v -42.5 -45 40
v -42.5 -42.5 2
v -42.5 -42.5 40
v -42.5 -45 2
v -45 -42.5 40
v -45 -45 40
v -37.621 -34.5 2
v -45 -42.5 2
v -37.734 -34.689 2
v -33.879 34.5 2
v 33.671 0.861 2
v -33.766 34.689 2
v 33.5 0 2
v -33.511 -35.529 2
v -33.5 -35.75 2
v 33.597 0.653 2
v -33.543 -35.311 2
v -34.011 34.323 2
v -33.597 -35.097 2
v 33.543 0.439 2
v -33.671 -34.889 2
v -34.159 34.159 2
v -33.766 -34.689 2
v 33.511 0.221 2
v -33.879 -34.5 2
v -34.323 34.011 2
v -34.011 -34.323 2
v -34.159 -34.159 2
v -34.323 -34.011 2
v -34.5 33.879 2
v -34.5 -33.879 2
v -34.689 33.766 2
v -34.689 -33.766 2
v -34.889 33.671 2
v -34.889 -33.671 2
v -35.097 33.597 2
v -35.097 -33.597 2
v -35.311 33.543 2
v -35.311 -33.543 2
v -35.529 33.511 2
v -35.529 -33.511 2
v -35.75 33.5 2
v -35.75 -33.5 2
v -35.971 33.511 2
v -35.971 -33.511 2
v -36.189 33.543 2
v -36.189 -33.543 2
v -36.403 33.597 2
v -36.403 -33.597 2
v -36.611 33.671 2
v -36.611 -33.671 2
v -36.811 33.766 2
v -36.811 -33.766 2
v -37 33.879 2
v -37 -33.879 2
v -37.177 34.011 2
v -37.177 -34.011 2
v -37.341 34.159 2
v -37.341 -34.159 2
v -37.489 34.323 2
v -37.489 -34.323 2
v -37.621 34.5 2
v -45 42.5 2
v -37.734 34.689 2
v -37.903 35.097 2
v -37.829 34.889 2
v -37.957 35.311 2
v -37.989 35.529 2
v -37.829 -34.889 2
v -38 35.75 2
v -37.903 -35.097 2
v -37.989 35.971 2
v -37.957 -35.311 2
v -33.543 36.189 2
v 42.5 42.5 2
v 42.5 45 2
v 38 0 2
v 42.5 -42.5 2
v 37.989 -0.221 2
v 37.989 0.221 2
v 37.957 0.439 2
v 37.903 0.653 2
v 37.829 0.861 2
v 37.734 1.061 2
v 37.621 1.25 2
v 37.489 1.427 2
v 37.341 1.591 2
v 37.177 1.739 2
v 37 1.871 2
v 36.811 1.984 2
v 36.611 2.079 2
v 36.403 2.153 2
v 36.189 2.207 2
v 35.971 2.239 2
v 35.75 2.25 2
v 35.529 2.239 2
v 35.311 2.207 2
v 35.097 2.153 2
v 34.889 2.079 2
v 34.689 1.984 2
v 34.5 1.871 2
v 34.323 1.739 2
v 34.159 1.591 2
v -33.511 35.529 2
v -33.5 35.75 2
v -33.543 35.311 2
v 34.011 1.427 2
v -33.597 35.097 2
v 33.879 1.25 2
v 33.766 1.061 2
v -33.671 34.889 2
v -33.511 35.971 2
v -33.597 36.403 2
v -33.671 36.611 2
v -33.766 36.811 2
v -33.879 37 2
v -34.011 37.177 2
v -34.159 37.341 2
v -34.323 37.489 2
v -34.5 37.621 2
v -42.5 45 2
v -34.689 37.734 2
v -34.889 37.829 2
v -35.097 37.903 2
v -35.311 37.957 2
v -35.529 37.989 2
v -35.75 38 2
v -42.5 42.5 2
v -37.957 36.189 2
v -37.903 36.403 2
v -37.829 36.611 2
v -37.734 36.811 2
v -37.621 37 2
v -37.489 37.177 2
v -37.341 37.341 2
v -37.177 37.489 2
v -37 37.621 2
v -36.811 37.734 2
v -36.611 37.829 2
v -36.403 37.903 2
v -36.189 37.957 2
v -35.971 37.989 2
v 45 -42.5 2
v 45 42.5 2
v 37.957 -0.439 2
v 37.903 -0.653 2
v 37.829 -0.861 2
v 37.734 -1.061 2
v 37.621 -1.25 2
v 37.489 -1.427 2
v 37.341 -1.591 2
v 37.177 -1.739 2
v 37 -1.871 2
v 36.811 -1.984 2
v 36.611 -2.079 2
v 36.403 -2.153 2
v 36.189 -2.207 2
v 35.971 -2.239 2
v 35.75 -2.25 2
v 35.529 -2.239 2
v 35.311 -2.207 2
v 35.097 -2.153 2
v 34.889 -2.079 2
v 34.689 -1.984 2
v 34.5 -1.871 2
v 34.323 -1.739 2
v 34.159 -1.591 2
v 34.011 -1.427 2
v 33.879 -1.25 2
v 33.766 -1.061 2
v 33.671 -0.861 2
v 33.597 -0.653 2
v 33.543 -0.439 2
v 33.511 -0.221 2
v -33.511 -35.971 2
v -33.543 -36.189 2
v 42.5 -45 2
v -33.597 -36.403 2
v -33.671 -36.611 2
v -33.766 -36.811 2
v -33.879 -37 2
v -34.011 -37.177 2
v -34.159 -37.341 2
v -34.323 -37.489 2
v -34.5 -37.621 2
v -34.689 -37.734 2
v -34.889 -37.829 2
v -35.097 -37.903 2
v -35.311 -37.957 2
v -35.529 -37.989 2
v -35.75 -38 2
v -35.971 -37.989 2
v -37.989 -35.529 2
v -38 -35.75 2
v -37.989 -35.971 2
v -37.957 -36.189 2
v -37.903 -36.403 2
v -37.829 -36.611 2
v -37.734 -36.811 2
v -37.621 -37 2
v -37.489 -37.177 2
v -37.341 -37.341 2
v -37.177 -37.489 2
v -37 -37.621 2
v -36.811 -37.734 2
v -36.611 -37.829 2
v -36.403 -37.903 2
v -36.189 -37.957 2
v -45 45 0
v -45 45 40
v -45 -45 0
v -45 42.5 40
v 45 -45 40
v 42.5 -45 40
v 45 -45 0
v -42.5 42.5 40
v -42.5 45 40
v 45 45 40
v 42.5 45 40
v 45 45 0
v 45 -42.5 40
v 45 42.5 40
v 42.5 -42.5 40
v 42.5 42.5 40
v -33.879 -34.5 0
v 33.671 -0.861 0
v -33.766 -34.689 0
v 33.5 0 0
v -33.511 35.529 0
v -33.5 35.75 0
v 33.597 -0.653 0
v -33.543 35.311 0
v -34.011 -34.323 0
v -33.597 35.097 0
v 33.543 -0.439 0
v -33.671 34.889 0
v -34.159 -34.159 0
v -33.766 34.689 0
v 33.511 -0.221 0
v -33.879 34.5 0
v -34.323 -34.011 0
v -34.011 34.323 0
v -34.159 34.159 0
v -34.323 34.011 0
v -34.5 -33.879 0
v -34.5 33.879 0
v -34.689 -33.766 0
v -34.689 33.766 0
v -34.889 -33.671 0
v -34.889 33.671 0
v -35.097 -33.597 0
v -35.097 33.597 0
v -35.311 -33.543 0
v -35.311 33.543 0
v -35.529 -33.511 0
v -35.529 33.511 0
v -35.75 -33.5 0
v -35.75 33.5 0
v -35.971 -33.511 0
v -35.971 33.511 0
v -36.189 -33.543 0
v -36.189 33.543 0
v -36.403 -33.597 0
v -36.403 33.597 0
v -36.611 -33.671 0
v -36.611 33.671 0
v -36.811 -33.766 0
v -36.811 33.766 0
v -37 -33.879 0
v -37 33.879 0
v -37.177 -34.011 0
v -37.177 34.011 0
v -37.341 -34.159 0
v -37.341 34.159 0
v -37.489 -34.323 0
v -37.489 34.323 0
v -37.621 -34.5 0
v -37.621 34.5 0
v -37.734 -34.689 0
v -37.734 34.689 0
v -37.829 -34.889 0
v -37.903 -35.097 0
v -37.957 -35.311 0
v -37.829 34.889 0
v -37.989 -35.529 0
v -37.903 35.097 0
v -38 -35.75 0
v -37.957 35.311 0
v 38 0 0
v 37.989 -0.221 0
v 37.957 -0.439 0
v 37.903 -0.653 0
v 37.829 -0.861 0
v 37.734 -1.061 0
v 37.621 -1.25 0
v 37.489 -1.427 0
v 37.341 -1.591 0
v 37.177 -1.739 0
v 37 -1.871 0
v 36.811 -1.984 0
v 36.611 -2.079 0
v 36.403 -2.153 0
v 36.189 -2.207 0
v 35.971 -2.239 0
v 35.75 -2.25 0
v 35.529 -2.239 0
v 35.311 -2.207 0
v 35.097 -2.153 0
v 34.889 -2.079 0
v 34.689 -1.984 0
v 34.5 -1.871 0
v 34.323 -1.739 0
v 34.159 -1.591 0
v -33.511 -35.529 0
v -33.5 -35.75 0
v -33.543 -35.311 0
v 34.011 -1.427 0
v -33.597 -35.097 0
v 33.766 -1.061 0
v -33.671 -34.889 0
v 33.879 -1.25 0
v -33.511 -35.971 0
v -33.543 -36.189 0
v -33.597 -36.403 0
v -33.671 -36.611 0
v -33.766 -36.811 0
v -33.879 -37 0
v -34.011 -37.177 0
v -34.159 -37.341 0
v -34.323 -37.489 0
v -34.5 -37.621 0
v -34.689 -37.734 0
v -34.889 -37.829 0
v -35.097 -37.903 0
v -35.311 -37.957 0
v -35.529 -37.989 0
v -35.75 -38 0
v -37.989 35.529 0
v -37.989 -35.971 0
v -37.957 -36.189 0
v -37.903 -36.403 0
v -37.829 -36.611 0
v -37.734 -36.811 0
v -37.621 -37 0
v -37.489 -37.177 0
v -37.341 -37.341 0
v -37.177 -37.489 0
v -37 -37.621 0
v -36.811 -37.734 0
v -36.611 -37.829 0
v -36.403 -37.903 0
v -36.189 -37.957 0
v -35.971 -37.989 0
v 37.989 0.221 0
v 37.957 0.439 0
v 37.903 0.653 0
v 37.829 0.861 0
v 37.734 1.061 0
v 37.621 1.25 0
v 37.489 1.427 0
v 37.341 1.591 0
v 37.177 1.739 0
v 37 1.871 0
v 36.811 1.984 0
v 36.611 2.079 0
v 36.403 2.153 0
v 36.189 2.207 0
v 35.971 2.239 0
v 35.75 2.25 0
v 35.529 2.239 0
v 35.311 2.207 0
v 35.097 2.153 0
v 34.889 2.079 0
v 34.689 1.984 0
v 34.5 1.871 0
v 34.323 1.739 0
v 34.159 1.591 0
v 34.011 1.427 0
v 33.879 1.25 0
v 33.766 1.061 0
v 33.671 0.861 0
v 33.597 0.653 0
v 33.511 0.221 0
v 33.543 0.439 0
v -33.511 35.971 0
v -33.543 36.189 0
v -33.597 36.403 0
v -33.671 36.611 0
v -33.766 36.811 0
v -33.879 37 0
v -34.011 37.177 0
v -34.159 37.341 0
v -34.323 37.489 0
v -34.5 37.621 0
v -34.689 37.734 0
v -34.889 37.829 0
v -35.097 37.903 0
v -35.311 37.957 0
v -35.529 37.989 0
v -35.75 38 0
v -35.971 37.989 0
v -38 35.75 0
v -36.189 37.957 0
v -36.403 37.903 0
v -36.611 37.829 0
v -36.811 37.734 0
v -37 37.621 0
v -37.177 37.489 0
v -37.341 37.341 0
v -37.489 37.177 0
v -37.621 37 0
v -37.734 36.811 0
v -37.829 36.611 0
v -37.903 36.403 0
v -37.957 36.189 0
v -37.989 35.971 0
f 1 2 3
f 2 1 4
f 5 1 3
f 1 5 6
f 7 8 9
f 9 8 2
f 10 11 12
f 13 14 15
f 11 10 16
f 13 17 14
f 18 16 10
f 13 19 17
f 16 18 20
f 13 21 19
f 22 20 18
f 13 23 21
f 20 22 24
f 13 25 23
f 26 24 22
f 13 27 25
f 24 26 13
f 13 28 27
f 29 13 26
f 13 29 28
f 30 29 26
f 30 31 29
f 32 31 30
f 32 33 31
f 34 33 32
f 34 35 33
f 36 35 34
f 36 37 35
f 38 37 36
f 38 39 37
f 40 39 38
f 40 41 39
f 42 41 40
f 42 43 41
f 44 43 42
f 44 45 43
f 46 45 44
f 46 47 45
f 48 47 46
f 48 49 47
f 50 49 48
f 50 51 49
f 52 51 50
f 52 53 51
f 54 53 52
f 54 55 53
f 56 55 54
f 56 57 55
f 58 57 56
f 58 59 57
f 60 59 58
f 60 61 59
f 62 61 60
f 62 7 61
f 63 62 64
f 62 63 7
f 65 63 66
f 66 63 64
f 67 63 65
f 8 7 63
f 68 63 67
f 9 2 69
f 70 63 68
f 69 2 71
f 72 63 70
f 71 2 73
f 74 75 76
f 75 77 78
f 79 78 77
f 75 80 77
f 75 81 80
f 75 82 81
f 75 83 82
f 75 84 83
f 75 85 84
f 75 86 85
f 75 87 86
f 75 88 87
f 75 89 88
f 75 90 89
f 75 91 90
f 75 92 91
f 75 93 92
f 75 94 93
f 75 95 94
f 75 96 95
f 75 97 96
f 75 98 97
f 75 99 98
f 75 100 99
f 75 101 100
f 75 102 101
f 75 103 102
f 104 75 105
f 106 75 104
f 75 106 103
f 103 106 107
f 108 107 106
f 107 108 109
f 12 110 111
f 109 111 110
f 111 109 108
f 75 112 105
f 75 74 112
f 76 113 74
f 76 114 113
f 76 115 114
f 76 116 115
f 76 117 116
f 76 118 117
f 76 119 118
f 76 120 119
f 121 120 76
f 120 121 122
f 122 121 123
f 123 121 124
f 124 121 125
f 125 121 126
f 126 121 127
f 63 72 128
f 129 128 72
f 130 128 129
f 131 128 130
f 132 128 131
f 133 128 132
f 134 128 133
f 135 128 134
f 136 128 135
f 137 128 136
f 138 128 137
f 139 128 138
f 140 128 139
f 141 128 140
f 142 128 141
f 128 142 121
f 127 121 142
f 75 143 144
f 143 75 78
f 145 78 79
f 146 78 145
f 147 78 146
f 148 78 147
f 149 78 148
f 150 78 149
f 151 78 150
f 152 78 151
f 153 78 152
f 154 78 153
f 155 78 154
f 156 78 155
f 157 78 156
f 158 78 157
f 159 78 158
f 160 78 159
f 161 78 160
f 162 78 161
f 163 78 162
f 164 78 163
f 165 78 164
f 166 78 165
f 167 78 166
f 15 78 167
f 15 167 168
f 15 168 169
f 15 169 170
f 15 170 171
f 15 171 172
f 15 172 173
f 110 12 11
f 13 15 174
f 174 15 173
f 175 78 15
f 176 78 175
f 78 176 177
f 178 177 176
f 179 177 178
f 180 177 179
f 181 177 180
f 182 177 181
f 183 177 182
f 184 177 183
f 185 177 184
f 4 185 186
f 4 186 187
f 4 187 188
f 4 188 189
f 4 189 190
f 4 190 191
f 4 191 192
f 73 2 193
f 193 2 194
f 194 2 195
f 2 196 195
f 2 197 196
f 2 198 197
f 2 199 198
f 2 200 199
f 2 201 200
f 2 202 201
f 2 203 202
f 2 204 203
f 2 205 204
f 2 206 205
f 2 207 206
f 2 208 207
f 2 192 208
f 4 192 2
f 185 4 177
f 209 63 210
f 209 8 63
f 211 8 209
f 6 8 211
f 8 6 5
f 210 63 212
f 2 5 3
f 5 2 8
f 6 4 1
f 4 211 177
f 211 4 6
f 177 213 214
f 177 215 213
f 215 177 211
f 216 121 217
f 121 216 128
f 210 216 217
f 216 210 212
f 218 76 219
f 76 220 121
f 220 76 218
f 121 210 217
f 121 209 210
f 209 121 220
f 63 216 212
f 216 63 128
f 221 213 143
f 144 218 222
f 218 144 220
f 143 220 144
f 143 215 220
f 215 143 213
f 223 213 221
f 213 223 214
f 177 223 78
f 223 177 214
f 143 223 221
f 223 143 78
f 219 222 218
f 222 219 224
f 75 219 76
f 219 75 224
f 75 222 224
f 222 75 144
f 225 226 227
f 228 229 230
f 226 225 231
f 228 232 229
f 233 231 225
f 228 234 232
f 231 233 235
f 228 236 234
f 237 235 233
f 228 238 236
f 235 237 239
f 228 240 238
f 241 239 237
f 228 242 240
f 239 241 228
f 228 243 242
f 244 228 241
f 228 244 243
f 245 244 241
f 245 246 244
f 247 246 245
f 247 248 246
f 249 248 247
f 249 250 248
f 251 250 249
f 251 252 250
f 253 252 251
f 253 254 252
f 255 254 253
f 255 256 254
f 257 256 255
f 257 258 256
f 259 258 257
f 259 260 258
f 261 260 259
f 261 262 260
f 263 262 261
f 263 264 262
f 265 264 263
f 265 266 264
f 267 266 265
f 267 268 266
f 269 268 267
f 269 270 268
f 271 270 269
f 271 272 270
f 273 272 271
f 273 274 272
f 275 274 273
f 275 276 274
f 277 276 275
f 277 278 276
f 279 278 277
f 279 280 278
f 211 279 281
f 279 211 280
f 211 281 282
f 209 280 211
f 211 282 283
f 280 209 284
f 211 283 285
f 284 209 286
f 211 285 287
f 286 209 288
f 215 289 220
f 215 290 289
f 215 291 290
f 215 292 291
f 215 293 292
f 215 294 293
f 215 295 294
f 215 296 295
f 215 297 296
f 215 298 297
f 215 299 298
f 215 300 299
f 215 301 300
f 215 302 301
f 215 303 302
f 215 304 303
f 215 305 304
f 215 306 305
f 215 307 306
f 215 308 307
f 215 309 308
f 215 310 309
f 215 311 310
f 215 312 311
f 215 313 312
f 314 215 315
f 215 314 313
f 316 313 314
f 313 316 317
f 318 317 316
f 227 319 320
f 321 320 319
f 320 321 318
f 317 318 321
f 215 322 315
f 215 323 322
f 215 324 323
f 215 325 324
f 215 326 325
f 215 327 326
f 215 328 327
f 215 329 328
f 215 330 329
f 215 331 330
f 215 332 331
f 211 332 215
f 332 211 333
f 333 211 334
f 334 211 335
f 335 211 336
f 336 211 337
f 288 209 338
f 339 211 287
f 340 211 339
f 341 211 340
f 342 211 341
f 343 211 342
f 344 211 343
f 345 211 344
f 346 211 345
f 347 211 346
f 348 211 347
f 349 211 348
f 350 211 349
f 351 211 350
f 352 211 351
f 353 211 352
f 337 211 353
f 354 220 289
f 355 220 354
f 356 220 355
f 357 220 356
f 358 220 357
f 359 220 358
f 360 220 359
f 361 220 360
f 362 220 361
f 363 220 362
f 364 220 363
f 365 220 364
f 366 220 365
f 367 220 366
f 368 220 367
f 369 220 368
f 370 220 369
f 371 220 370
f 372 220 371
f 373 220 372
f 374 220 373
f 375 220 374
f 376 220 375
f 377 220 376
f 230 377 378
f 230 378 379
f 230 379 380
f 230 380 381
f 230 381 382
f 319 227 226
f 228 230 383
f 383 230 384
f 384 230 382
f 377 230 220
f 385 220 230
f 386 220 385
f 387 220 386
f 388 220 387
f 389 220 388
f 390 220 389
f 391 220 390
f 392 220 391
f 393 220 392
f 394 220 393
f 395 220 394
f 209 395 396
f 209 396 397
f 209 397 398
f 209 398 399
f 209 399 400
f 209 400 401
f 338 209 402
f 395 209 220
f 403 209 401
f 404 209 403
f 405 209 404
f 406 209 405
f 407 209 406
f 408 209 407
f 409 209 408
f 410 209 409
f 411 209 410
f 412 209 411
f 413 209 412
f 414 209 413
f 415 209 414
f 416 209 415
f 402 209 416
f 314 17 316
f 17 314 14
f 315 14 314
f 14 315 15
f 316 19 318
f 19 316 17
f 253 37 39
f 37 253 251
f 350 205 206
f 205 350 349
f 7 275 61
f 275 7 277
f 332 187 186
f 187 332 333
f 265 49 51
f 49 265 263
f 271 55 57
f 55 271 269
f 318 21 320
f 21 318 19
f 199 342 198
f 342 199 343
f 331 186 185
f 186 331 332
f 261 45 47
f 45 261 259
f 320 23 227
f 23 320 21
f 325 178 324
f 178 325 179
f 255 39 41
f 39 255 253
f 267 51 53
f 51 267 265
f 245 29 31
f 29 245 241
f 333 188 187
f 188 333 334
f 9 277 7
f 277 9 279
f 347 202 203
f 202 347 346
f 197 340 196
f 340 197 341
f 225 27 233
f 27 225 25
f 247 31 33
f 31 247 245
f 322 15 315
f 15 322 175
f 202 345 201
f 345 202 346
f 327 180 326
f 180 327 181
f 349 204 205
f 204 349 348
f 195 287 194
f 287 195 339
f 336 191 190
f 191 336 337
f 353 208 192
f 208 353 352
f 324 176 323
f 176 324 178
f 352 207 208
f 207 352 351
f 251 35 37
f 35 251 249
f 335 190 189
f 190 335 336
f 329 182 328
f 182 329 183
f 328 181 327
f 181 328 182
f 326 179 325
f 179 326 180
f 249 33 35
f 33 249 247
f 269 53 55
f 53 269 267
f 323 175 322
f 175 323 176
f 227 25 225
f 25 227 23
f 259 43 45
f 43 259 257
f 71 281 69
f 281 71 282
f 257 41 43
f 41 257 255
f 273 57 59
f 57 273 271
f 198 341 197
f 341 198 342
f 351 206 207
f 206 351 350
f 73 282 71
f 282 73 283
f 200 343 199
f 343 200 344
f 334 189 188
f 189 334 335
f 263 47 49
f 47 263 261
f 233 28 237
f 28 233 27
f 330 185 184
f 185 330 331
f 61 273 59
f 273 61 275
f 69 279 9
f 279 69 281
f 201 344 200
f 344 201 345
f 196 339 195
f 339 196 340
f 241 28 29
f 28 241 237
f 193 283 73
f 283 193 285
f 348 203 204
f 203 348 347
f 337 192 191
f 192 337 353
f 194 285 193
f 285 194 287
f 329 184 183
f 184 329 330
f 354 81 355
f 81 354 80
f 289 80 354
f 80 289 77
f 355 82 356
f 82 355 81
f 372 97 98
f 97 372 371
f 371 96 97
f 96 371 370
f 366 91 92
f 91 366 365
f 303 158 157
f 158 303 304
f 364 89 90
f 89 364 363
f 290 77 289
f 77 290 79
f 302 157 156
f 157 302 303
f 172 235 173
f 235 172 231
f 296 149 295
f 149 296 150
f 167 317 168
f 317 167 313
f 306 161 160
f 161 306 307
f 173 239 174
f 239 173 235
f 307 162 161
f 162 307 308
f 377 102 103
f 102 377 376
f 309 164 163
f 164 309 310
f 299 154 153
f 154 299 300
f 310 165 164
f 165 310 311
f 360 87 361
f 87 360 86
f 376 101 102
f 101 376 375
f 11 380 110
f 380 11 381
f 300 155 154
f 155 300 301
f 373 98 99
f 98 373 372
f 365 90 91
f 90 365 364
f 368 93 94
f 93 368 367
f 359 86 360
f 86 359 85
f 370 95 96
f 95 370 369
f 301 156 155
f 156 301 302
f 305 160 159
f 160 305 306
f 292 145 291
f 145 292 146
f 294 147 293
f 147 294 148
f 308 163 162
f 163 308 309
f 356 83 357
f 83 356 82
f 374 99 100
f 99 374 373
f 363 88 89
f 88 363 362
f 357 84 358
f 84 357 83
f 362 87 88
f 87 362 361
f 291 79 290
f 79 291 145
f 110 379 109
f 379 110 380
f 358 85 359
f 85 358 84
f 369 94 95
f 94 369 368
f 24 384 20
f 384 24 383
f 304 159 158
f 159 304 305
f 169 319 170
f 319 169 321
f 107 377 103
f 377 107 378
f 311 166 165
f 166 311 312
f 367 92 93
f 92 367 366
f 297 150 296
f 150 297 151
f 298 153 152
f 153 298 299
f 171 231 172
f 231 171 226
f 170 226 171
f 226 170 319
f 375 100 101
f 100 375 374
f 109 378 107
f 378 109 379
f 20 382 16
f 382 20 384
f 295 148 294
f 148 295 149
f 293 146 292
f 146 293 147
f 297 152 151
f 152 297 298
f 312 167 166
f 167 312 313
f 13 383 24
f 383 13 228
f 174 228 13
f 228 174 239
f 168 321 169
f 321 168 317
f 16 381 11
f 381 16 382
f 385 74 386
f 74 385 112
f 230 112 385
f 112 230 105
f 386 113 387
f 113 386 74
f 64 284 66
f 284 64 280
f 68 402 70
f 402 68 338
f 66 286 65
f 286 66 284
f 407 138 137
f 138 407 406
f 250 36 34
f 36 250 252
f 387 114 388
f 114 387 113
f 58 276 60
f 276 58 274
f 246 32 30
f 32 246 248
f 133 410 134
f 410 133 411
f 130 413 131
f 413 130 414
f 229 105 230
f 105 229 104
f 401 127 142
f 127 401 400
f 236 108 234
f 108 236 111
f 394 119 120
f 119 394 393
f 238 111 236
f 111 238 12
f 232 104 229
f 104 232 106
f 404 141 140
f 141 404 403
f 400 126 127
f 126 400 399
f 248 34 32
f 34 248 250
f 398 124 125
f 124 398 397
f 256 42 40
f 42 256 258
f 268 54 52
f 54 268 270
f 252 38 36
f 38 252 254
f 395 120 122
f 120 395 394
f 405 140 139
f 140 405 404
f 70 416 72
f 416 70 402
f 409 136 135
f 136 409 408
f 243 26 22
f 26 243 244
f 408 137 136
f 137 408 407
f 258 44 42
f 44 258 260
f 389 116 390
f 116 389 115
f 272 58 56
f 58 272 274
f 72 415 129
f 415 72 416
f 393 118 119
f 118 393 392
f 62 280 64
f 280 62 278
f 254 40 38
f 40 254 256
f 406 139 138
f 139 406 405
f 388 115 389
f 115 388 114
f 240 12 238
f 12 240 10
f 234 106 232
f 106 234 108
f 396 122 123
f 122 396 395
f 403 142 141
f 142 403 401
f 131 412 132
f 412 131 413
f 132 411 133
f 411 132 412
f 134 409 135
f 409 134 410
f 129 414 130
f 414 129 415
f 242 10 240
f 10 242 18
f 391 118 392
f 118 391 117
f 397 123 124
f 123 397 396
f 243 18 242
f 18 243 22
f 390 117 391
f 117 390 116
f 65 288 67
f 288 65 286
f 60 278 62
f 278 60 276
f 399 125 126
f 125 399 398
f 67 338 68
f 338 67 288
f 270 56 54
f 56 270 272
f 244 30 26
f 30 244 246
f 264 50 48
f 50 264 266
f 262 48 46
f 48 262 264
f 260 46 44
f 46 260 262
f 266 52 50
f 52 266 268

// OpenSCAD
// DIY magnetic stirrer housing for 80 mm PC case fan
// Print orientation: top plate on bed (z = 0), walls build upward (+Z)

// ---------------- Parameters ----------------
outer_size   = 90;    // outer size of box (X and Y), mm
top_plate_t  = 2;     // top plate thickness, mm (z = 0 to 2)
wall_t       = 2.5;   // wall thickness, mm (z = 2 to 40)
open_top_z   = 40;    // height of open top edge, mm
hole_d       = 4.5;   // screw hole diameter (M4), mm
hole_count   = 4;     // number of screw holes
hole_pitch   = 71.5;  // square pattern pitch for holes, mm
notch_w      = 12;    // power cable notch width, mm
notch_depth  = 8;     // notch depth from open edge, mm (z = 32 to 40)
eps          = 0.5;   // cutter overshoot past faces, mm

$fn = 64;

// ---------------- Model ----------------
difference() {
    union() {
        // Top plate
        translate([-outer_size/2, -outer_size/2, 0])
            cube([outer_size, outer_size, top_plate_t]);

        // Walls (rise from top plate to open top)
        for (sx = [-1, 1], sy = [-1, 1])
            translate([sx > 0 ? outer_size/2 - wall_t : -outer_size/2,
                       sy > 0 ? outer_size/2 - wall_t : -outer_size/2,
                       top_plate_t])
                cube([wall_t, wall_t, open_top_z - top_plate_t]);
    }

    // Screw holes through top plate on square pattern
    for (i = [0 : hole_count - 1]) {
        x = (i % 2 - 0.5) * hole_pitch;
        y = (i / 2 - 0.5) * hole_pitch;
        translate([x, y, -eps])
            cylinder(d = hole_d, h = top_plate_t + 2*eps);
    }

    // Power cable notch in one wall (12 mm wide, centred along wall)
    translate([outer_size/2 - wall_t - 6, 0, open_top_z - notch_depth])
        cube([notch_w, wall_t, notch_depth + eps]);
}
